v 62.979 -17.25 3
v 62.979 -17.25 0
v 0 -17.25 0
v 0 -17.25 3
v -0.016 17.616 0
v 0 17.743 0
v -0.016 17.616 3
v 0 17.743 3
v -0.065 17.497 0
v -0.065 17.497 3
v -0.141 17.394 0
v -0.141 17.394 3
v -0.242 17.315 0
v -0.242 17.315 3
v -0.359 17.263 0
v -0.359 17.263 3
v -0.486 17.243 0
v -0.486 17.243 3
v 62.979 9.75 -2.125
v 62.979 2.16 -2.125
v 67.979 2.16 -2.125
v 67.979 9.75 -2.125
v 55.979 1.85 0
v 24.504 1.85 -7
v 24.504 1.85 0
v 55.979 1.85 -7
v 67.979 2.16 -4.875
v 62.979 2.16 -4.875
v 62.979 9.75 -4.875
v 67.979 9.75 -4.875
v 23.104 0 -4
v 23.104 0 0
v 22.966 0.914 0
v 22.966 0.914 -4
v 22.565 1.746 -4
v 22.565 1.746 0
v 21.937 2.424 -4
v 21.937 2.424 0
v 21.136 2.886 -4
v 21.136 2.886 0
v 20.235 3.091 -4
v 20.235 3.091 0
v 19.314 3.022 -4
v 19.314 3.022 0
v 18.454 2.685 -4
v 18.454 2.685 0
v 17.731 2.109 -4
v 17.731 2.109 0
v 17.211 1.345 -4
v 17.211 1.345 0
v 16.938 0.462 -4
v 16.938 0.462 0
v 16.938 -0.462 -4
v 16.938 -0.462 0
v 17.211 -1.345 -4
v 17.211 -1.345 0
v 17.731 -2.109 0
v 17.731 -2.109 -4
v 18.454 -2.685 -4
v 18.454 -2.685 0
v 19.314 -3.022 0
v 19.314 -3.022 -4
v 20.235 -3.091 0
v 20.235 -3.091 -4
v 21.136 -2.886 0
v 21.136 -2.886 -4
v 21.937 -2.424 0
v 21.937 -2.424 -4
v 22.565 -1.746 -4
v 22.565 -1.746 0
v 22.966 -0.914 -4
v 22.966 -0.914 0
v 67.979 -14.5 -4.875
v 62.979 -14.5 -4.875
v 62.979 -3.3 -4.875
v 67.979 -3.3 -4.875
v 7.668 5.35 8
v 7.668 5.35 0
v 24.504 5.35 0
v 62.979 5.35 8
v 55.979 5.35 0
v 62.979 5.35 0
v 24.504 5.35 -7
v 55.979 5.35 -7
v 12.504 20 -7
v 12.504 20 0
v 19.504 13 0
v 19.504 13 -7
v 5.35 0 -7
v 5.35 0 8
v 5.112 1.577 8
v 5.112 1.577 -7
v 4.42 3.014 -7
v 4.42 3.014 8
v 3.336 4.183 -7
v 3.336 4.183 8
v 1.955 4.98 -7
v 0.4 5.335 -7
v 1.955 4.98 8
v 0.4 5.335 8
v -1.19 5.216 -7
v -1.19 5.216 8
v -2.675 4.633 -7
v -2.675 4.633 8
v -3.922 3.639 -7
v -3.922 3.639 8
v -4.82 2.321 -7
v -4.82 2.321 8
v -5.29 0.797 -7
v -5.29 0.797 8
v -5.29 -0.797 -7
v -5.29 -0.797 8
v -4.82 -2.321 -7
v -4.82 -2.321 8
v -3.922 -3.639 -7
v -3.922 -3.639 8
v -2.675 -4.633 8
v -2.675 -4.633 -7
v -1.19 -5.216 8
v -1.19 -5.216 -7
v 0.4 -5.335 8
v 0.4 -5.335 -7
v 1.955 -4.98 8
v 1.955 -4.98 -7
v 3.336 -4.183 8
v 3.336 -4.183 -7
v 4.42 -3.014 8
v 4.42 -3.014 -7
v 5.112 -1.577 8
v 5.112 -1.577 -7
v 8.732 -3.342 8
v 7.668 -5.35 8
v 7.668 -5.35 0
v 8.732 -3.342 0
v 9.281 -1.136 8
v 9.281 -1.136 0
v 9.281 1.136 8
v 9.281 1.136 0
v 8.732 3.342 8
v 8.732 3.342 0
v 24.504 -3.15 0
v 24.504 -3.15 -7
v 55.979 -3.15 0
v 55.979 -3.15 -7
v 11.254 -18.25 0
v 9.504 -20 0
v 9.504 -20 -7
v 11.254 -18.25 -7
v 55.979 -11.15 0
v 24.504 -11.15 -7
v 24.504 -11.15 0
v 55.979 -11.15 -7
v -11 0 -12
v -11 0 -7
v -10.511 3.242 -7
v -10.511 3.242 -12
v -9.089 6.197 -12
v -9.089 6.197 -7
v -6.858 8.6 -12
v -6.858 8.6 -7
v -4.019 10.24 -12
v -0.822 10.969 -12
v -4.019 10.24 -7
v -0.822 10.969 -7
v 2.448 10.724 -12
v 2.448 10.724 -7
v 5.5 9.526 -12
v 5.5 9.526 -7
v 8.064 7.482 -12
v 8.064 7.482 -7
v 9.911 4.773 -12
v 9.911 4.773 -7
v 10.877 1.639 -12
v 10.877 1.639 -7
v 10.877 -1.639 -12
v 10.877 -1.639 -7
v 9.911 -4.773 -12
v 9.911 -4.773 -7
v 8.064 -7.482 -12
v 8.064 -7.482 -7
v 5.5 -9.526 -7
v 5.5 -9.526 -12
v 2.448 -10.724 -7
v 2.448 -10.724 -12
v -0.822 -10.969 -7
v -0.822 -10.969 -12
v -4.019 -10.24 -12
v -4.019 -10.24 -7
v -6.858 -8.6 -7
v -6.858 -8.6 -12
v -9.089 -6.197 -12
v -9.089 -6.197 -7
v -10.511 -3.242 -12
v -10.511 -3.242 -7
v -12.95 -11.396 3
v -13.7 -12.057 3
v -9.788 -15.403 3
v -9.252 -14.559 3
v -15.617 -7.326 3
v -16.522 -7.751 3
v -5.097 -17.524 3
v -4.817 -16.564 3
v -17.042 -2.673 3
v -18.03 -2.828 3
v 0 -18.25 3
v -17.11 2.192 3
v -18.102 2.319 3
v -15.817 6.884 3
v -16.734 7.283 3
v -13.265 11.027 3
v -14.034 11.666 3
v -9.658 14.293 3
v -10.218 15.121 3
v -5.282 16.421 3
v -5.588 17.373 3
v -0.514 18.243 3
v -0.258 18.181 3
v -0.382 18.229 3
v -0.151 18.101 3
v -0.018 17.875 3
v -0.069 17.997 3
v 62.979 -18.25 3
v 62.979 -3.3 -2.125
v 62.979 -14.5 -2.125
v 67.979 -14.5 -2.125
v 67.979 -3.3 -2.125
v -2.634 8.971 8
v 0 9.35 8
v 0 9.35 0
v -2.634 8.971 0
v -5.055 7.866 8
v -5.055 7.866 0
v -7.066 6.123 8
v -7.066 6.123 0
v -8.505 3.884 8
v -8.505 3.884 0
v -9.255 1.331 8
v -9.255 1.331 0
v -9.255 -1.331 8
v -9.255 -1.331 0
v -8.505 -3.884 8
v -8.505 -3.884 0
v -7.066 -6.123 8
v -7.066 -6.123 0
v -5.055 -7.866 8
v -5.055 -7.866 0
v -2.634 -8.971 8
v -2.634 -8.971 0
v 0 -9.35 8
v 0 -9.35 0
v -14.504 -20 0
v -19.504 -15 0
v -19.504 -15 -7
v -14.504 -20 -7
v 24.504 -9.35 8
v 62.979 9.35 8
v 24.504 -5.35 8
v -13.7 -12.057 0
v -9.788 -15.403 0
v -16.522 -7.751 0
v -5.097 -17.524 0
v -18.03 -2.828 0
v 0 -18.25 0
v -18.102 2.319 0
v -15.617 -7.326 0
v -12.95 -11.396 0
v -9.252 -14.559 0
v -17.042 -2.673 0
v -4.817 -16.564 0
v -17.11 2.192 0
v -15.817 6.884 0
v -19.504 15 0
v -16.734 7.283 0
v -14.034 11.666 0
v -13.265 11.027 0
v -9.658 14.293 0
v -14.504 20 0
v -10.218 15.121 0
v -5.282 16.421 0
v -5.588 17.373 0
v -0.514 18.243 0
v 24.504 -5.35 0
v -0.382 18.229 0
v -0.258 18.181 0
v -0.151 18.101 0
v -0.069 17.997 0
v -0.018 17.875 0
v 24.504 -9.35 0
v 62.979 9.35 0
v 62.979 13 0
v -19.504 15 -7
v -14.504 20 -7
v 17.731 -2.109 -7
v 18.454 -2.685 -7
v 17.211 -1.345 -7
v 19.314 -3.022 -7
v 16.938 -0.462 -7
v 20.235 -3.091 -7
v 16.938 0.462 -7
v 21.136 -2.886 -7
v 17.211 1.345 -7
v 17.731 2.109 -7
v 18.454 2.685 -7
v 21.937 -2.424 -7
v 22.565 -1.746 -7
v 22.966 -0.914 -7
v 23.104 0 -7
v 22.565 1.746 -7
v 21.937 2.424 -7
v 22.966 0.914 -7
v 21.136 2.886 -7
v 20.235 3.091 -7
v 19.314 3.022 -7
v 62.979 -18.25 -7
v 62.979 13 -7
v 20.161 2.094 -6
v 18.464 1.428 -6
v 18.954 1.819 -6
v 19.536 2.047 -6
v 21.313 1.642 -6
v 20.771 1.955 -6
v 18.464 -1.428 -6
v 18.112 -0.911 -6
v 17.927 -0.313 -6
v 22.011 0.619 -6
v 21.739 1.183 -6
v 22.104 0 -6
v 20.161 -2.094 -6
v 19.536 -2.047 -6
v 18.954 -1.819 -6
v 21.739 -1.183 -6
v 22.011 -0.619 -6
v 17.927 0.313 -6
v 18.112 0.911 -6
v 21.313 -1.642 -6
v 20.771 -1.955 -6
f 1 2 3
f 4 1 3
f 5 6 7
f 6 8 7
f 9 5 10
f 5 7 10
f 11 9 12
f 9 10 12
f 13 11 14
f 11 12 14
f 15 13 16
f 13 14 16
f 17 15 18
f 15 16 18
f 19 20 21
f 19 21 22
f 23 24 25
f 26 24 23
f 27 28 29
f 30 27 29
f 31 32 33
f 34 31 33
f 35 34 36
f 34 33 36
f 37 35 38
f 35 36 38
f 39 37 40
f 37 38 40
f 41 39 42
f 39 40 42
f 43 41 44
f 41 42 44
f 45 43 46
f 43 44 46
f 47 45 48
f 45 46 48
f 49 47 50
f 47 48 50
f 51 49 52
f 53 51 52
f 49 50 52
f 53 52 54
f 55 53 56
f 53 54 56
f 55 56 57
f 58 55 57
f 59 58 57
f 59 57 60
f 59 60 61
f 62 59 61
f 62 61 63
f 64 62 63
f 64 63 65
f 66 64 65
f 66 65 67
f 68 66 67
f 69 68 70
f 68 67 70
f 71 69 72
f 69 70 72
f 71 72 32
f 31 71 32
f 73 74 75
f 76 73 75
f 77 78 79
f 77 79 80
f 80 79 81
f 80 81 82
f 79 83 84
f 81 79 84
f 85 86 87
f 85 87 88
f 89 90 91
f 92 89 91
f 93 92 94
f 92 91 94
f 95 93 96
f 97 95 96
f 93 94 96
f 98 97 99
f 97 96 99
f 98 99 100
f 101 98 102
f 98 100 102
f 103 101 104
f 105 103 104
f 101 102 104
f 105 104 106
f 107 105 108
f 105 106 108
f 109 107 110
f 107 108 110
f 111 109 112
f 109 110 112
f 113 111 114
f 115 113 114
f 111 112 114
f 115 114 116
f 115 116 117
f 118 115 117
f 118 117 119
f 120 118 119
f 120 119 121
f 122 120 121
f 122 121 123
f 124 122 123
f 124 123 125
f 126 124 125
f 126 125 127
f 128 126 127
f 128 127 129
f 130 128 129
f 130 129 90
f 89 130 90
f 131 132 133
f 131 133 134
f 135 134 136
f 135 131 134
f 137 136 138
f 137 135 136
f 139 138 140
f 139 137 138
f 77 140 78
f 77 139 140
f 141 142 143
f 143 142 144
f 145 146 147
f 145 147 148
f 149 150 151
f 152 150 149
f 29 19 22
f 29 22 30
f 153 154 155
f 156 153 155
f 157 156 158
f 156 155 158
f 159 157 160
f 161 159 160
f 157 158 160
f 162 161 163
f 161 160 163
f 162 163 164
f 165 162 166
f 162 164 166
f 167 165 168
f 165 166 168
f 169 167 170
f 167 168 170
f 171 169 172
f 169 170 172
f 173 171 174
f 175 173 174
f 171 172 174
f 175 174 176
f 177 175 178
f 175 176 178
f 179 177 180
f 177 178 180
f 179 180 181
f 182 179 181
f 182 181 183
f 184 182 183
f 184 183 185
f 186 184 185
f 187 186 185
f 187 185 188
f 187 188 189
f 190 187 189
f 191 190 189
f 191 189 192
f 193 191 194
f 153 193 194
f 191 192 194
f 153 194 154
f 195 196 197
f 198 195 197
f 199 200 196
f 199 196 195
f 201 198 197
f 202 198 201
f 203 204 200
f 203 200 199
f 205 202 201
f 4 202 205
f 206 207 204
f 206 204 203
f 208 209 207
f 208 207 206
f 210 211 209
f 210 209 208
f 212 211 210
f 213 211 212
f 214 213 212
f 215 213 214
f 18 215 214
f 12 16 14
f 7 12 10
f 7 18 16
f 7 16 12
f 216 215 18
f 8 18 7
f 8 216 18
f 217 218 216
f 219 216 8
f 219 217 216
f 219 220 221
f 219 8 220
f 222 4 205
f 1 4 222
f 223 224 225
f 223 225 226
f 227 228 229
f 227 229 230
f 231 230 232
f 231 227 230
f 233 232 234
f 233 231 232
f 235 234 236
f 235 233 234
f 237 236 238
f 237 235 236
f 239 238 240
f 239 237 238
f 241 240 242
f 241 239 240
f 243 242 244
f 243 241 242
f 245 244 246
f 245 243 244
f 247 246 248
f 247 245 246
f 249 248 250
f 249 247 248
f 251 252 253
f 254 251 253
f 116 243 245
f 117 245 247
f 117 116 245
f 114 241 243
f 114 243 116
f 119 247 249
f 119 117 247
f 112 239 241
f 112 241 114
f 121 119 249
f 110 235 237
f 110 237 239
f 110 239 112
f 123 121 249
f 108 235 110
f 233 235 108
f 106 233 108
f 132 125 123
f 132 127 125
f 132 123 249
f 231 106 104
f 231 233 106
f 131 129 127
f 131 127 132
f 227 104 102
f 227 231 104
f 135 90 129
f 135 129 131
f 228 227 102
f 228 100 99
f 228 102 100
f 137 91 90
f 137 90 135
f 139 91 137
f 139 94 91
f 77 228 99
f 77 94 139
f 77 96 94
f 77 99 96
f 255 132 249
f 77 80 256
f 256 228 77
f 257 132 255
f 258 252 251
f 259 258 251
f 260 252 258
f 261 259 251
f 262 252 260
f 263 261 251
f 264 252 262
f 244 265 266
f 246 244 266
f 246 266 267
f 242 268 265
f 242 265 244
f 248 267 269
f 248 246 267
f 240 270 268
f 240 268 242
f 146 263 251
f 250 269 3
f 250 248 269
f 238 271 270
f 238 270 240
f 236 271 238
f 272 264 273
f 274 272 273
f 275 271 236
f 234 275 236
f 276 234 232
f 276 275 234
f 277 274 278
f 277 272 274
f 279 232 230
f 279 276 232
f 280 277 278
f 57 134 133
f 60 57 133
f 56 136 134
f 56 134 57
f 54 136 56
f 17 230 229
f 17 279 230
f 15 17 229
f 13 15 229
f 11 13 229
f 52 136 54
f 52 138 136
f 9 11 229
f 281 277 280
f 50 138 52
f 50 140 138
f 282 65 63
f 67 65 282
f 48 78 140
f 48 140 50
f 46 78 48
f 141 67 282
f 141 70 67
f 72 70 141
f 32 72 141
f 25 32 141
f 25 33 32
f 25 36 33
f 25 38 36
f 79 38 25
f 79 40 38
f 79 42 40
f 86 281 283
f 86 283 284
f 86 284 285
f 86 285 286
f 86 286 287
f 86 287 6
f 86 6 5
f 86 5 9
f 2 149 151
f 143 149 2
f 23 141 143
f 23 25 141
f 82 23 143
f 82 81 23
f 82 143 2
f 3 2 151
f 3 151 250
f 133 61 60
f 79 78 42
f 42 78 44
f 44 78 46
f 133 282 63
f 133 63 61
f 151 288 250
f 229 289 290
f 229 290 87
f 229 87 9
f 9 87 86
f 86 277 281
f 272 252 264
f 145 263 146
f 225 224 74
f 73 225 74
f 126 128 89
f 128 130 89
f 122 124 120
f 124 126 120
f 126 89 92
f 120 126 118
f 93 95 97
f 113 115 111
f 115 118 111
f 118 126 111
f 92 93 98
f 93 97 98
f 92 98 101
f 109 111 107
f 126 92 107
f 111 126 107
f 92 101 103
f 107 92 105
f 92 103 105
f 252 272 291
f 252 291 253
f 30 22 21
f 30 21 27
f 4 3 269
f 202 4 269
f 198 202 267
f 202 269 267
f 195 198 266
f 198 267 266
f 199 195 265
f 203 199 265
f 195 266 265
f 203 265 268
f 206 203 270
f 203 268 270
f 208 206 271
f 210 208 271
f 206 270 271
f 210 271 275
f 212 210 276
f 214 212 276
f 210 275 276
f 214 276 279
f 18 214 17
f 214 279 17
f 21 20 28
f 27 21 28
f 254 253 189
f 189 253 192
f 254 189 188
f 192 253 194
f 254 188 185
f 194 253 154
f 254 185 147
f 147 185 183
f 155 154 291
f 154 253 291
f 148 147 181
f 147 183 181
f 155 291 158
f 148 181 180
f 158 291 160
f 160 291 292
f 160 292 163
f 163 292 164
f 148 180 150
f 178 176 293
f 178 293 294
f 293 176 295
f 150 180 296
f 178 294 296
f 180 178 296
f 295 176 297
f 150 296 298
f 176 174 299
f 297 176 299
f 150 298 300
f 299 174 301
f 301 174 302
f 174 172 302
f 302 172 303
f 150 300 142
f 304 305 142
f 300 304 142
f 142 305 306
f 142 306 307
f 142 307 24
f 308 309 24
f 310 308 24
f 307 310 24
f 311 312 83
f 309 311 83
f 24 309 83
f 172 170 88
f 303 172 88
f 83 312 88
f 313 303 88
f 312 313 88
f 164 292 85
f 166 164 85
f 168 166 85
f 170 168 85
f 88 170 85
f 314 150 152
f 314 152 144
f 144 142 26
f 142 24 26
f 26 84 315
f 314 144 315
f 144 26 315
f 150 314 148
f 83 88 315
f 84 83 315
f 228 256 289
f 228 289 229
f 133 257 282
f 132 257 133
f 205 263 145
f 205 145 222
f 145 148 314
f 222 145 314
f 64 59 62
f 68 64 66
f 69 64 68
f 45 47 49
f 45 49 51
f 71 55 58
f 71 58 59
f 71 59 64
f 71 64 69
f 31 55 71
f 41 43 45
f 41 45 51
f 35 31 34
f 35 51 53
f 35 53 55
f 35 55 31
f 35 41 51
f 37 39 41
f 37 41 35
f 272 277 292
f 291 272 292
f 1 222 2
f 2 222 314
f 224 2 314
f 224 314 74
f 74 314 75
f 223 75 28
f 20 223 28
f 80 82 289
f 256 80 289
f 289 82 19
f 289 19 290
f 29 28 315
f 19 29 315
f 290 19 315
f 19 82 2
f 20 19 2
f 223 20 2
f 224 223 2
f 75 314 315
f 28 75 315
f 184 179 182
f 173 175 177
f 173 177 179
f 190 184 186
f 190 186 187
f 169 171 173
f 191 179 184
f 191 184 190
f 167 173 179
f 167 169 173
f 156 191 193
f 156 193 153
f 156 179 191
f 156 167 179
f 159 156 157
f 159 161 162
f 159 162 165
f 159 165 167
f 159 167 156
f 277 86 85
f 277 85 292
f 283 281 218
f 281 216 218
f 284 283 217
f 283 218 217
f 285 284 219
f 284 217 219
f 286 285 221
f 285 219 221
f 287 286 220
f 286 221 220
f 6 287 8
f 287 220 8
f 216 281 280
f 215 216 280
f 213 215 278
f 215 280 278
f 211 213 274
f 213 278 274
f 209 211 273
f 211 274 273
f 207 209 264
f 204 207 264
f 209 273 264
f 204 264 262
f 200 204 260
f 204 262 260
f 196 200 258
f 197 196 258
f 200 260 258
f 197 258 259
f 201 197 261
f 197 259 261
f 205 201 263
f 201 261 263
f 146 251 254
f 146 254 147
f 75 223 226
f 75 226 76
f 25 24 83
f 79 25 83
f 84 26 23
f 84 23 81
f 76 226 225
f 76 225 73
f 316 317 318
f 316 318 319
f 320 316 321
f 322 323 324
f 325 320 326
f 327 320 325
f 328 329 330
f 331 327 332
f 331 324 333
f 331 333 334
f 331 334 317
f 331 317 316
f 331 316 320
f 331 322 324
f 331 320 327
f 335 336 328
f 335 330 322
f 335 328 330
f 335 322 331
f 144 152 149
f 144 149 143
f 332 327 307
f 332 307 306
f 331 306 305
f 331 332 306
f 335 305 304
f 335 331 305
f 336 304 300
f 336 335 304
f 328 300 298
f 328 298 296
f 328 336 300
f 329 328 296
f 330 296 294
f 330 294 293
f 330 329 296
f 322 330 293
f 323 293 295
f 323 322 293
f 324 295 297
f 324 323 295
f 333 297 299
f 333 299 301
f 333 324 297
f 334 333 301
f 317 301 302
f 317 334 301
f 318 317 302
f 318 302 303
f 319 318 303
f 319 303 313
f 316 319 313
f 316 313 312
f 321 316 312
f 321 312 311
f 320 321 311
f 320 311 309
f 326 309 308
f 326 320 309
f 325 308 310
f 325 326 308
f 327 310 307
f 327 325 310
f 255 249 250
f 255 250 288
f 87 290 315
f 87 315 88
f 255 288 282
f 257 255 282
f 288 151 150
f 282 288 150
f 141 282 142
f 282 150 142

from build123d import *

# Parameters (mm, degrees)
SKETCH1_R               = 5.35
BOSS_EXTRUDE2_DEPTH     = 7
BOSS_EXTRUDE3_START     = 8
SKETCH3_R               = 5.35
BOSS_EXTRUDE3_DEPTH     = 8
BOSS_EXTRUDE4_DEPTH     = 3
CHAMFER1_SIZE           = 10
CHAMFER2_SIZE           = 5
CUT_EXTRUDE1_DEPTH      = 67.560662475
CUT_EXTRUDE1_DEPTH_BACK = 67.560662475
SKETCH5_W               = 31.474956737
SKETCH5_H               = 3.5
SKETCH5_H_2             = 8
CHAMFER3_SIZE           = 7
SKETCH6_W               = 2.75
SKETCH6_H               = 7.59
SKETCH6_H_2             = 11.2
BOSS_EXTRUDE5_DEPTH     = 5
SKETCH7_R               = 11
BOSS_EXTRUDE6_DEPTH     = 5
CUT_EXTRUDE2_REACH      = 87.717
SKETCH8_W               = 8
SKETCH8_H               = 4
SKETCH9_R               = 3.1
CUT_EXTRUDE3_DEPTH      = 4
CUT_EXTRUDE4_START      = -1
SKETCH10_R              = 3.1
CUT_EXTRUDE4_DEPTH      = 1
CHAMFER4_SIZE           = 1
FILLET3_R               = 0.5


# Some blends are built 0.0001 mm under size
with BuildPart() as part:
    # Sketch1 → Boss-Extrude2 (new body)
    with BuildSketch(Plane.XY):
        Polygon((-19.503784034, -20), (19.503784034, -20), (19.503784034, -18.25), (62.978740771, -18.25), (62.978740771, 13), (19.503784034, 13), (19.503784034, 20), (-19.503784034, 20), align=None)
        Circle(SKETCH1_R, mode=Mode.SUBTRACT)
    extrude(amount=-BOSS_EXTRUDE2_DEPTH)

    # Sketch3 → Boss-Extrude3 (add)
    with BuildSketch(Plane.XY.offset(BOSS_EXTRUDE3_START)):
        with BuildLine():
            Line((7.668115805, 5.35), (62.978740771, 5.35))
            Line((62.978740771, 5.35), (62.978740771, 9.35))
            Line((62.978740771, 9.35), (0, 9.35))
            ThreePointArc((0, 9.35), (-9.35, 0), (0, -9.35))
            Line((0, -9.35), (62.978740771, -9.35))
            Line((62.978740771, -9.35), (62.978740771, -5.35))
            Line((62.978740771, -5.35), (7.668115805, -5.35))
            ThreePointArc((7.668115805, -5.35), (9.35, 0), (7.668115805, 5.35))
        make_face()
        Circle(SKETCH3_R, mode=Mode.SUBTRACT)
    extrude(amount=-BOSS_EXTRUDE3_DEPTH)

    # Sketch4 → Boss-Extrude4 (add)
    with BuildSketch(Plane.XY):
        with BuildLine():
            Line((0, -18.25), (62.978740771, -18.25))
            Line((62.978740771, -18.25), (62.978740771, -17.25))
            Line((62.978740771, -17.25), (8.306623863, -17.25))
            Line((8.306623863, -17.25), (0, -17.25))
            ThreePointArc((0, -17.25), (-17.25, 0), (0, 17.25))
            Line((0, 17.25), (0, 18.25))
            ThreePointArc((0, 18.25), (-18.25, 0), (0, -18.25))
        make_face()
    extrude(amount=BOSS_EXTRUDE4_DEPTH)

    # Chamfer1
    # the kernel refuses this chamfer: 10 mm, written as the material it takes off along each edge
    with BuildSketch(Plane(origin=(19.503784034, -20, 25.71682988), x_dir=(-0.9996219169112968, -0.027495876610586317, 0), z_dir=(0, 0, -1))) as chamfer1_piece_1_section:
        Polygon((CHAMFER1_SIZE * 0.999621916911, CHAMFER1_SIZE * 0.0274958766106), (-CHAMFER1_SIZE * 0.0274958766106, CHAMFER1_SIZE * 0.999621916911), (0, 0), align=None)
    chamfer1_piece_1 = extrude(amount=58.433659759, mode=Mode.PRIVATE)
    chamfer1_piece_1 = split(chamfer1_piece_1, bisect_by=Plane(origin=(14.814200223, -18.25, -3.5), z_dir=(0, -1, 0)), keep=Keep.TOP, mode=Mode.PRIVATE)
    add(chamfer1_piece_1, mode=Mode.SUBTRACT)

    # Chamfer2
    chamfer2_edges = [part.edges().sort_by_distance(p)[0] for p in [
        (-19.503784034, -20, -3.5),
        (-19.503784034, 20, -3.5),
    ]]
    chamfer(chamfer2_edges, length=CHAMFER2_SIZE)

    # Sketch5 → Cut-Extrude1 (cut, two sides: drawn at the far end of the back side and taken through both)
    with BuildSketch(Plane.XY.offset(-CUT_EXTRUDE1_DEPTH_BACK)):
        with Locations((40.241262403, 3.6)):
            Rectangle(SKETCH5_W, SKETCH5_H)
        with Locations((40.241262403, -7.15)):
            Rectangle(SKETCH5_W, SKETCH5_H_2)
    extrude(amount=CUT_EXTRUDE1_DEPTH + CUT_EXTRUDE1_DEPTH_BACK, mode=Mode.SUBTRACT)

    # Chamfer3
    chamfer3_edges = [part.edges().sort_by_distance(p)[0] for p in [
        (19.503784034, 20, -3.5),
    ]]
    chamfer(chamfer3_edges, length=CHAMFER3_SIZE - 0.0001)  # a hair under: the kernel refuses the full size

    # Sketch6 → Boss-Extrude5 (add)
    with BuildSketch(Plane(origin=(62.978740771, 0, 0), x_dir=(0, 0, -1), z_dir=(1, 0, 0))):
        with Locations((3.5, 5.955)):
            Rectangle(SKETCH6_W, SKETCH6_H)
        with Locations((3.5, -8.9)):
            Rectangle(SKETCH6_W, SKETCH6_H_2)
    extrude(amount=BOSS_EXTRUDE5_DEPTH)

    # Sketch7 → Boss-Extrude6 (add)
    with BuildSketch(Plane(origin=(0, 0, -7), x_dir=(-1, 0, 0), z_dir=(0, 0, -1))):
        Circle(SKETCH7_R)
    extrude(amount=BOSS_EXTRUDE6_DEPTH)

    # Sketch8 → Cut-Extrude2 (cut, up to next)
    with BuildSketch(Plane(origin=(62.978740771, 0, 0), x_dir=(0, 0, -1), z_dir=(1, 0, 0)), mode=Mode.PRIVATE) as cut_extrude2_sk1:
        with Locations((-4, -7.35)):
            Rectangle(SKETCH8_W, SKETCH8_H)
    cut_extrude2_tool1 = extrude(cut_extrude2_sk1.sketch, amount=-CUT_EXTRUDE2_REACH, mode=Mode.PRIVATE) & part.part
    add(cut_extrude2_tool1.solids().sort_by_distance((62.978741, -7.35, 4))[0], mode=Mode.SUBTRACT)

    # Sketch9 → Cut-Extrude3 (cut)
    with BuildSketch(Plane.XY):
        with Locations((20.003784034, 0)):
            Circle(SKETCH9_R)
    extrude(amount=-CUT_EXTRUDE3_DEPTH, mode=Mode.SUBTRACT)

    # Sketch10 → Cut-Extrude4 (cut)
    with BuildSketch(Plane(origin=(0, 0, -7), x_dir=(-1, 0, 0), z_dir=(0, 0, -1)).offset(CUT_EXTRUDE4_START)):
        with Locations(Location((-20.003784034, 0, 0), (0, 0, 180))):
            Circle(SKETCH10_R)
    extrude(amount=CUT_EXTRUDE4_DEPTH, mode=Mode.SUBTRACT)

    # Chamfer4
    chamfer4_edges = [part.edges().sort_by_distance(p)[0] for p in [
        (16.903784034, 0, -6),
    ]]
    chamfer(chamfer4_edges, length=CHAMFER4_SIZE - 0.0001)  # a hair under: the kernel refuses the full size

    # Fillet3
    fillet3_edges = [part.edges().sort_by_distance(p)[0] for p in [
        (0, 18.25, 1.5),
        (0, 17.25, 1.5),
    ]]
    fillet(fillet3_edges, radius=FILLET3_R - 0.0001)  # a hair under: the kernel refuses the full size


solid = part.part
